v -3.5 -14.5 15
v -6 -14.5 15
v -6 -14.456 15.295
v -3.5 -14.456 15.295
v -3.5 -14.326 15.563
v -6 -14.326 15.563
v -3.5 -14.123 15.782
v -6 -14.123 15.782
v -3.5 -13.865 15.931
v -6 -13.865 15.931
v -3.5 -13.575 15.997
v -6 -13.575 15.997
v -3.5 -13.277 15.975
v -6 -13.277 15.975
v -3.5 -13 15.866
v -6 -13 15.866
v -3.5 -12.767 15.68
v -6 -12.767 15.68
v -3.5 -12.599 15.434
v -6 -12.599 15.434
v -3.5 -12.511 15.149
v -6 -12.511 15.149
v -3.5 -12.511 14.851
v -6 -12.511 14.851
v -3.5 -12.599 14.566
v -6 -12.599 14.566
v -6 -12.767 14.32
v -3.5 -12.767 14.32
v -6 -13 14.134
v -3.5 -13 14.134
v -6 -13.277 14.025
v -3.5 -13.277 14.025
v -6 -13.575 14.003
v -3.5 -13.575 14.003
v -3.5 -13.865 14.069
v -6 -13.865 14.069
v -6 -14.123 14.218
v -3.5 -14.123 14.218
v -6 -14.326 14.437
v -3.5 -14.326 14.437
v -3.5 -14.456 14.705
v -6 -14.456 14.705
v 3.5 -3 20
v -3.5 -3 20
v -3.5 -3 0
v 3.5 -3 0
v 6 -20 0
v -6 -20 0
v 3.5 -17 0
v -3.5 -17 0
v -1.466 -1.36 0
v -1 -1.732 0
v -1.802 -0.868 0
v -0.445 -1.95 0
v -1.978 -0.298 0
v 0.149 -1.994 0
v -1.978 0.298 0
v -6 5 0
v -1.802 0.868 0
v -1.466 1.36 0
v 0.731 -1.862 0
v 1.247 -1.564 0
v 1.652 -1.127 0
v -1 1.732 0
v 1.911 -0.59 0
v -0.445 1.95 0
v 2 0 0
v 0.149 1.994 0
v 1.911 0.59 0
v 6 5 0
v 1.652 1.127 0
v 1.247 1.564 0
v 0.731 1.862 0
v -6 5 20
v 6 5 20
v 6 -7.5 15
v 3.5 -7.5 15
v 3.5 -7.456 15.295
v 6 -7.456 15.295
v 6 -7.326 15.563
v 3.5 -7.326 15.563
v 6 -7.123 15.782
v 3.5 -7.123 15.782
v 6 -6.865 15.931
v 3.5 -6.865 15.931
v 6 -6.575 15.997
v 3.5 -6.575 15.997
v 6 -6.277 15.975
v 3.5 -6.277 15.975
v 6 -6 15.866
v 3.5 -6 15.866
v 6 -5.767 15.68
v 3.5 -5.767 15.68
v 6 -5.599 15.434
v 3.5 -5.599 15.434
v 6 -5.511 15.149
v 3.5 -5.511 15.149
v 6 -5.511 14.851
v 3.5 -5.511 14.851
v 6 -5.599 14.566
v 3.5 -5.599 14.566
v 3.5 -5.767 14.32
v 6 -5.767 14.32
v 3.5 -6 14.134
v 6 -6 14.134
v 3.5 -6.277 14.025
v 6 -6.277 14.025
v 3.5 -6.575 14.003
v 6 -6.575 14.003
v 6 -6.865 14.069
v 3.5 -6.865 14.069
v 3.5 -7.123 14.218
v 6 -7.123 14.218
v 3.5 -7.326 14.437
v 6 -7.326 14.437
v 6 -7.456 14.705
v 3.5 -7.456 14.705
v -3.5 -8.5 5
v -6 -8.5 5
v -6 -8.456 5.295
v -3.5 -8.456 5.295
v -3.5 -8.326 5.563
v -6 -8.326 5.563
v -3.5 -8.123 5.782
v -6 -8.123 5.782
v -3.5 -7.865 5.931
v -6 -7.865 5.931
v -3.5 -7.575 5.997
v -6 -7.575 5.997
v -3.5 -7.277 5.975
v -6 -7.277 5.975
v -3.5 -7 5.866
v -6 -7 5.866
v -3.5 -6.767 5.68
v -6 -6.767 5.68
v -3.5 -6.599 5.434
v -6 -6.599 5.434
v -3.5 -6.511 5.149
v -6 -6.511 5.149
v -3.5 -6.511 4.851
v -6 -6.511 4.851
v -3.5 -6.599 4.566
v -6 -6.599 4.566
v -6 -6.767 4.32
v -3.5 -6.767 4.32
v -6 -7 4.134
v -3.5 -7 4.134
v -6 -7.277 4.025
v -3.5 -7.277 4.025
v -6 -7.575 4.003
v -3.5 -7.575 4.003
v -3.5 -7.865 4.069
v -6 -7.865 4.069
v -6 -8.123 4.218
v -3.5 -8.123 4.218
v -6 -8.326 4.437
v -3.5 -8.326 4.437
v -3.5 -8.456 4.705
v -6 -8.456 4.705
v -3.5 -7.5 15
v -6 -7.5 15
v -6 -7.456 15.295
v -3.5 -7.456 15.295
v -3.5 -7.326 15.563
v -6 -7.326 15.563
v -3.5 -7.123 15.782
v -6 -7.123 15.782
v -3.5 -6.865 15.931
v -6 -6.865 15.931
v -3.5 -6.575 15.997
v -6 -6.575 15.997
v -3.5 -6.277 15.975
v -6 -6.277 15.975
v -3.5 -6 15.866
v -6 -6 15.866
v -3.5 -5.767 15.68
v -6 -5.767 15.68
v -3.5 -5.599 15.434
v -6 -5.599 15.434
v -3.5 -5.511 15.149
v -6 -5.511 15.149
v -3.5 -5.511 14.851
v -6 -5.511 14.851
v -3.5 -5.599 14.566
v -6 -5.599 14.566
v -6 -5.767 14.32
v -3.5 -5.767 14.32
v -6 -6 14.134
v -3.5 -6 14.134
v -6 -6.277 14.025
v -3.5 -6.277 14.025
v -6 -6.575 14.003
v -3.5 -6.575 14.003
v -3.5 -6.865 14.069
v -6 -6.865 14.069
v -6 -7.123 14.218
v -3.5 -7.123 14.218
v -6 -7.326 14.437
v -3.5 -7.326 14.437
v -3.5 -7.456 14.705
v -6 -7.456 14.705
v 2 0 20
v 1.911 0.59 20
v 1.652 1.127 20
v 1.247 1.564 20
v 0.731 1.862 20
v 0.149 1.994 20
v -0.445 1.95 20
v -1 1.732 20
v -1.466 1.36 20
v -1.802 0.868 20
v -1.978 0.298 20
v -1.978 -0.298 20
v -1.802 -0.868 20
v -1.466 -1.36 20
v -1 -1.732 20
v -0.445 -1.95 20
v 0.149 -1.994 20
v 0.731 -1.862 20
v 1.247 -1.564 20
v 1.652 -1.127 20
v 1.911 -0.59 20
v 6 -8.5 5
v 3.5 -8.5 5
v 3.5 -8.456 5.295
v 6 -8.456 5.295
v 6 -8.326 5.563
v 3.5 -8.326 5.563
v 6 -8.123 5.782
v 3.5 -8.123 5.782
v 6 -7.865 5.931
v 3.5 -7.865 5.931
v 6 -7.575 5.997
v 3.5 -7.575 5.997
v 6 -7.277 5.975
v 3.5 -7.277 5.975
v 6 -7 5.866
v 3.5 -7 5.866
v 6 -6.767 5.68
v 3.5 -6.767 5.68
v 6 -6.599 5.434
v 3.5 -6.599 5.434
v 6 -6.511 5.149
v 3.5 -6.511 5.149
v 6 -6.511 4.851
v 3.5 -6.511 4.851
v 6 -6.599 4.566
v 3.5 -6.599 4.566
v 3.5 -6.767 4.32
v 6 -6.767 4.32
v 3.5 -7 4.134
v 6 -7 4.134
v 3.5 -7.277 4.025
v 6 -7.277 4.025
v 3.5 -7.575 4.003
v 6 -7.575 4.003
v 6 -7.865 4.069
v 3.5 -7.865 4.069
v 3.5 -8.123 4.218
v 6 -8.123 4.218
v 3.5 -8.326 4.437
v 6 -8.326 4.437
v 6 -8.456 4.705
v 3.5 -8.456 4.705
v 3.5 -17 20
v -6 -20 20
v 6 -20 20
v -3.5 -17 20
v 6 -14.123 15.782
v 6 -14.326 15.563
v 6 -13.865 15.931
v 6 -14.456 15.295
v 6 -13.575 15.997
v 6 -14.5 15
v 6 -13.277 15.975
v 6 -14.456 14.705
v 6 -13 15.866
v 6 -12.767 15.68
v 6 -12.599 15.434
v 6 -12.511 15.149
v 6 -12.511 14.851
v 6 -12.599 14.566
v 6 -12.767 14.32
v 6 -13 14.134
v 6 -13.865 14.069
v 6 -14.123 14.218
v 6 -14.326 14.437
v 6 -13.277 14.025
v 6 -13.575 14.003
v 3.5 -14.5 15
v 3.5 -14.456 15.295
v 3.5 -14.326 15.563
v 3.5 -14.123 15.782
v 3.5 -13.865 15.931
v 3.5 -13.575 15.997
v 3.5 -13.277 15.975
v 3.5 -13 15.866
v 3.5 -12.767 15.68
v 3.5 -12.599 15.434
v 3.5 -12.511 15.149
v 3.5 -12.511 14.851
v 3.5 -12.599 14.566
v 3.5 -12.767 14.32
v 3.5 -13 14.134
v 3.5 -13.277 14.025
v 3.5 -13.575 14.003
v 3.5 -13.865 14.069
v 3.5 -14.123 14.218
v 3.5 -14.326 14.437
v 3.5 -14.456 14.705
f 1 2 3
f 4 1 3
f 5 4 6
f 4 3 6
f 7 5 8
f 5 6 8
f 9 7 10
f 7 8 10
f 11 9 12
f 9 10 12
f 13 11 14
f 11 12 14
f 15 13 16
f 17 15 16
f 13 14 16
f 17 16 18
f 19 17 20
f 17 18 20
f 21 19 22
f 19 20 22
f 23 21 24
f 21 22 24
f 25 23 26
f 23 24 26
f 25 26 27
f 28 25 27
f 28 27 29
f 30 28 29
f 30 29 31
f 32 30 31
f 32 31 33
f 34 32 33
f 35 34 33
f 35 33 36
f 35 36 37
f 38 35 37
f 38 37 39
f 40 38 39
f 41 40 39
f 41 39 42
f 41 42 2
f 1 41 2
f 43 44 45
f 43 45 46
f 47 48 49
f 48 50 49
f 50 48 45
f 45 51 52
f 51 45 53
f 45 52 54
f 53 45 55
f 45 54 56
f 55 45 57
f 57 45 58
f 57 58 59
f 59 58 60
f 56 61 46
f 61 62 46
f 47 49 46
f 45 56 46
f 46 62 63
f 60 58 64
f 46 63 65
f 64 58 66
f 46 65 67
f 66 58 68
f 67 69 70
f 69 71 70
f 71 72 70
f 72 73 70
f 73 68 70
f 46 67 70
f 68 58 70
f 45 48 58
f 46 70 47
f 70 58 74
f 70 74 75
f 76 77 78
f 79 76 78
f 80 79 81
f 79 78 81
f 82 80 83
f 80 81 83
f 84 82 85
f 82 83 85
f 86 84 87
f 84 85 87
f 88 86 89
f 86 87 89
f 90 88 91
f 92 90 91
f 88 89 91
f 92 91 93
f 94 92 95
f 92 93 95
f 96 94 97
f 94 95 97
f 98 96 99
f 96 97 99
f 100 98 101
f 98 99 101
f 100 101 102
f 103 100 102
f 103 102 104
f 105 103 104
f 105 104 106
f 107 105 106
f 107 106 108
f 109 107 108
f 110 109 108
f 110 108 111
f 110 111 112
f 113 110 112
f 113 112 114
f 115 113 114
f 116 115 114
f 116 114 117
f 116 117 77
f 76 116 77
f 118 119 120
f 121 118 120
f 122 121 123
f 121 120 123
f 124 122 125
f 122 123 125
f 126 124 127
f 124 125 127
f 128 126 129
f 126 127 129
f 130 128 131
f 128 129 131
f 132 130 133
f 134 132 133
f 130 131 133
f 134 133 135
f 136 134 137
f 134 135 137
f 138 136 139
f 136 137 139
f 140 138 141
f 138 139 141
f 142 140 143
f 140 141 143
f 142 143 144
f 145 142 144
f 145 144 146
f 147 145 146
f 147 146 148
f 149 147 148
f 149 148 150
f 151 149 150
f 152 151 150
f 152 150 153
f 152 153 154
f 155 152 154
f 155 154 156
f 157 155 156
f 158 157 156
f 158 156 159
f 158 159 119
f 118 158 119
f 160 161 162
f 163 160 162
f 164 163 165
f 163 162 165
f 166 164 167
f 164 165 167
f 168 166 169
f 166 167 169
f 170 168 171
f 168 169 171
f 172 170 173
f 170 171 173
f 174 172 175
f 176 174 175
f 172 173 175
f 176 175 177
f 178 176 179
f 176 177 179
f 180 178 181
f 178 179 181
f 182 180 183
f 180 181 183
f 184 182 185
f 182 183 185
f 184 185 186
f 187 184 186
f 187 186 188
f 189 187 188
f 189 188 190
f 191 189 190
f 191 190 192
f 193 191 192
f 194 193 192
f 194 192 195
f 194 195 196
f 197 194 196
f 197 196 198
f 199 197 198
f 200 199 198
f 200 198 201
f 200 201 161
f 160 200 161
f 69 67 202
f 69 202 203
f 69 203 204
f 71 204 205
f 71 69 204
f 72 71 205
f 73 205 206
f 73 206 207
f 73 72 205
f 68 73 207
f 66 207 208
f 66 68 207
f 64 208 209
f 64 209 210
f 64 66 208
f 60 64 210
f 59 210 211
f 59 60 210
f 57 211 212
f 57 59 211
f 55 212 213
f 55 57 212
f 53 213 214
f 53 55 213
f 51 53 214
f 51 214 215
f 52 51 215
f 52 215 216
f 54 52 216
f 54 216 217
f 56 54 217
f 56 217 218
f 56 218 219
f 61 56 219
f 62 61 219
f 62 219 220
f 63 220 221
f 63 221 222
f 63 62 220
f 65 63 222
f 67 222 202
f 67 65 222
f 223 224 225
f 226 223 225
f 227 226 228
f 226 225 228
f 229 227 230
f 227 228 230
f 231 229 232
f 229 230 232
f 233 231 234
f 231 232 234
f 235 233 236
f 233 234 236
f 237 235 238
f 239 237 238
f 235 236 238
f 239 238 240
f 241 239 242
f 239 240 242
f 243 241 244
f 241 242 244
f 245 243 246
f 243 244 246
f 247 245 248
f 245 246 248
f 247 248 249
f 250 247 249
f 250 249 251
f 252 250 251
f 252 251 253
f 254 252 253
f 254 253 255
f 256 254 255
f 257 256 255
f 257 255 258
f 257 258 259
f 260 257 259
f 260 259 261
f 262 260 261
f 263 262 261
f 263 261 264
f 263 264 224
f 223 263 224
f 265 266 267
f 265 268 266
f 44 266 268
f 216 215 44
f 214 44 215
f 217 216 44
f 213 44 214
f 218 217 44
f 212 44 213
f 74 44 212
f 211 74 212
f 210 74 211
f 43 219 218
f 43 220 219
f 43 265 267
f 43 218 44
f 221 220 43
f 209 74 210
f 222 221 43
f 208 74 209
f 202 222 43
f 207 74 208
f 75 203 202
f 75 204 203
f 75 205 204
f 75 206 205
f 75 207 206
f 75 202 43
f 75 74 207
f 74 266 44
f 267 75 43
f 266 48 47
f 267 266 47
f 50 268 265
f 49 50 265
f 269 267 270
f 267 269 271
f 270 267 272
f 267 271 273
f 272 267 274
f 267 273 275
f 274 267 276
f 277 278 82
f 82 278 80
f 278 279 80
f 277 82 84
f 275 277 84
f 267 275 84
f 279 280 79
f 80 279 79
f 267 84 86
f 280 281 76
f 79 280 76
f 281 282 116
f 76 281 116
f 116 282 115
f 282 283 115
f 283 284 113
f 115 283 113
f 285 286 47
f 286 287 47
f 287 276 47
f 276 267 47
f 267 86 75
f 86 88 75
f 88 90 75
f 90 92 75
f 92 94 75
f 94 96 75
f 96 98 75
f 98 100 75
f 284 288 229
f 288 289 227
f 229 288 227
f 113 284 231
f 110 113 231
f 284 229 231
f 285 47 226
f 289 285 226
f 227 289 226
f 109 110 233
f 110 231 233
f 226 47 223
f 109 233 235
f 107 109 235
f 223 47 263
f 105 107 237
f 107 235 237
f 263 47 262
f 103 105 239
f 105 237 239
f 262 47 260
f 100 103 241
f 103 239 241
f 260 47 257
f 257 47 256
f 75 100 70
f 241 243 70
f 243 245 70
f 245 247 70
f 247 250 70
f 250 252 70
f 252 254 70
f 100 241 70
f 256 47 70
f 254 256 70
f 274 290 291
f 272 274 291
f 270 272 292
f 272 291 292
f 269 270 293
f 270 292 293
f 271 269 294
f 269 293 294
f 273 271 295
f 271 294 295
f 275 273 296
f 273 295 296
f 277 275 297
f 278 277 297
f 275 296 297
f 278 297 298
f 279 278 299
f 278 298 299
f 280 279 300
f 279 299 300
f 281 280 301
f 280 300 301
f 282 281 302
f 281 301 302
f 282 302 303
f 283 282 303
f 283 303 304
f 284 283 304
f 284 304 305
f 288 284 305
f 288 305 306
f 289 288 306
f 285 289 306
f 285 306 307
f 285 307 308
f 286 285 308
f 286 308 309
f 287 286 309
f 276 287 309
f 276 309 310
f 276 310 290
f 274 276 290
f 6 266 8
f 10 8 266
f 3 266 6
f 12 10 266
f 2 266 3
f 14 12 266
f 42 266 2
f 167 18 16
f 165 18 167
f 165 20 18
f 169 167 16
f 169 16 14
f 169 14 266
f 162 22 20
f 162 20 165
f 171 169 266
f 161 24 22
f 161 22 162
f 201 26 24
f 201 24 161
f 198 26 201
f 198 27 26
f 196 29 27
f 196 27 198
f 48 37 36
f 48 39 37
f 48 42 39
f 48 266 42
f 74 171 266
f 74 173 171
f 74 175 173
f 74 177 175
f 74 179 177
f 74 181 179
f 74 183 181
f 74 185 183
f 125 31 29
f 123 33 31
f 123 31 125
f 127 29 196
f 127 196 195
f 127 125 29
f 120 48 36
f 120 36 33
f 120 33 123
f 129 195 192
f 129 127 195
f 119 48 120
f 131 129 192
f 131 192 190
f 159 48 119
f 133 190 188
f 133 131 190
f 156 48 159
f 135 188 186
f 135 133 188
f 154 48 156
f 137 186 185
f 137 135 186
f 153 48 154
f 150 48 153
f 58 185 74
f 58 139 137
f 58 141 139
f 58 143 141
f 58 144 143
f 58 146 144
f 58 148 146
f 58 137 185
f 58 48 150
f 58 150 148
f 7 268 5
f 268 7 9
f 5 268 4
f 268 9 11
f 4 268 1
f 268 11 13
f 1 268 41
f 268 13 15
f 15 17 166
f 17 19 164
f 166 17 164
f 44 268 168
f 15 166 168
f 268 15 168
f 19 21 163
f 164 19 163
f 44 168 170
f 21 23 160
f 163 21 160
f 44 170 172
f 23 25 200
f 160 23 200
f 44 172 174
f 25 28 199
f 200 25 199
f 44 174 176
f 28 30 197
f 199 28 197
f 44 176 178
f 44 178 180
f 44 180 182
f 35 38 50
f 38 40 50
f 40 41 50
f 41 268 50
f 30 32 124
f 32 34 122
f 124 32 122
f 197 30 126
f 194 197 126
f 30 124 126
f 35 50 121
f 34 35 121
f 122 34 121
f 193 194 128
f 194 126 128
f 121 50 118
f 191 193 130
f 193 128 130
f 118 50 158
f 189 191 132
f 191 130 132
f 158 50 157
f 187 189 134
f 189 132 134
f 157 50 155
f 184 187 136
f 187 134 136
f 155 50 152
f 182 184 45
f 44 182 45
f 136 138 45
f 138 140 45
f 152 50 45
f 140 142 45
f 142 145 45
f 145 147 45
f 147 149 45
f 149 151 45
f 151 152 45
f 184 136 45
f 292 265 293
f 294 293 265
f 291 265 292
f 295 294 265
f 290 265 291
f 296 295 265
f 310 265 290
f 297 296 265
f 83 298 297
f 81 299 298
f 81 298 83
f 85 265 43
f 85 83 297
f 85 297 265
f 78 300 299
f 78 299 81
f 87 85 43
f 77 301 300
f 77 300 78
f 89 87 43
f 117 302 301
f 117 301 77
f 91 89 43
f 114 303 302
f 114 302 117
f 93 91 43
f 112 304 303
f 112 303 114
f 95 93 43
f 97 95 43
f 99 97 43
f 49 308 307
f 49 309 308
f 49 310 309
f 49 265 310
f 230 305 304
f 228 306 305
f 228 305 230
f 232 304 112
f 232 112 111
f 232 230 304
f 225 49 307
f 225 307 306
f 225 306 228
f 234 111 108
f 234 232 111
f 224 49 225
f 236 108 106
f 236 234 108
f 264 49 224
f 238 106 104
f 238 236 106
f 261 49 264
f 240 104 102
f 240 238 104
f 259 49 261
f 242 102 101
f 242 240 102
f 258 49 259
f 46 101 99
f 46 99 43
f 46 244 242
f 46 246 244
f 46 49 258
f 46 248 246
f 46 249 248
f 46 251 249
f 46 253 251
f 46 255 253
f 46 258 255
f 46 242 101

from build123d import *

# Parameters (mm, degrees)
F0_W     = 12
F0_H     = 25
F0_W_2   = 7
F0_H_2   = 14
F0_R     = 2
F1_DEPTH = 20
F2_R     = 1
F3_DEPTH = 12.001


with BuildPart() as f1:
    # F0 (on Top) → F1 (new body)
    with BuildSketch(Plane.XY):
        with Locations((0, -7.5)):
            Rectangle(F0_W, F0_H)
        with Locations((0, -10)):
            Rectangle(F0_W_2, F0_H_2, mode=Mode.SUBTRACT)
        Circle(F0_R, mode=Mode.SUBTRACT)
    extrude(amount=F1_DEPTH)

    # F2 (on face) → F3 (cut, through all)
    with BuildSketch(Plane(origin=(-6, 0, 0), x_dir=(0, -1, 0), z_dir=(-1, 0, 0))):
        with Locations((13.5, 15)):
            Circle(F2_R)
        with Locations((6.5, 15)):
            Circle(F2_R)
        with Locations((7.5, 5)):
            Circle(F2_R)
    extrude(amount=-F3_DEPTH, mode=Mode.SUBTRACT)


solid = f1.part
